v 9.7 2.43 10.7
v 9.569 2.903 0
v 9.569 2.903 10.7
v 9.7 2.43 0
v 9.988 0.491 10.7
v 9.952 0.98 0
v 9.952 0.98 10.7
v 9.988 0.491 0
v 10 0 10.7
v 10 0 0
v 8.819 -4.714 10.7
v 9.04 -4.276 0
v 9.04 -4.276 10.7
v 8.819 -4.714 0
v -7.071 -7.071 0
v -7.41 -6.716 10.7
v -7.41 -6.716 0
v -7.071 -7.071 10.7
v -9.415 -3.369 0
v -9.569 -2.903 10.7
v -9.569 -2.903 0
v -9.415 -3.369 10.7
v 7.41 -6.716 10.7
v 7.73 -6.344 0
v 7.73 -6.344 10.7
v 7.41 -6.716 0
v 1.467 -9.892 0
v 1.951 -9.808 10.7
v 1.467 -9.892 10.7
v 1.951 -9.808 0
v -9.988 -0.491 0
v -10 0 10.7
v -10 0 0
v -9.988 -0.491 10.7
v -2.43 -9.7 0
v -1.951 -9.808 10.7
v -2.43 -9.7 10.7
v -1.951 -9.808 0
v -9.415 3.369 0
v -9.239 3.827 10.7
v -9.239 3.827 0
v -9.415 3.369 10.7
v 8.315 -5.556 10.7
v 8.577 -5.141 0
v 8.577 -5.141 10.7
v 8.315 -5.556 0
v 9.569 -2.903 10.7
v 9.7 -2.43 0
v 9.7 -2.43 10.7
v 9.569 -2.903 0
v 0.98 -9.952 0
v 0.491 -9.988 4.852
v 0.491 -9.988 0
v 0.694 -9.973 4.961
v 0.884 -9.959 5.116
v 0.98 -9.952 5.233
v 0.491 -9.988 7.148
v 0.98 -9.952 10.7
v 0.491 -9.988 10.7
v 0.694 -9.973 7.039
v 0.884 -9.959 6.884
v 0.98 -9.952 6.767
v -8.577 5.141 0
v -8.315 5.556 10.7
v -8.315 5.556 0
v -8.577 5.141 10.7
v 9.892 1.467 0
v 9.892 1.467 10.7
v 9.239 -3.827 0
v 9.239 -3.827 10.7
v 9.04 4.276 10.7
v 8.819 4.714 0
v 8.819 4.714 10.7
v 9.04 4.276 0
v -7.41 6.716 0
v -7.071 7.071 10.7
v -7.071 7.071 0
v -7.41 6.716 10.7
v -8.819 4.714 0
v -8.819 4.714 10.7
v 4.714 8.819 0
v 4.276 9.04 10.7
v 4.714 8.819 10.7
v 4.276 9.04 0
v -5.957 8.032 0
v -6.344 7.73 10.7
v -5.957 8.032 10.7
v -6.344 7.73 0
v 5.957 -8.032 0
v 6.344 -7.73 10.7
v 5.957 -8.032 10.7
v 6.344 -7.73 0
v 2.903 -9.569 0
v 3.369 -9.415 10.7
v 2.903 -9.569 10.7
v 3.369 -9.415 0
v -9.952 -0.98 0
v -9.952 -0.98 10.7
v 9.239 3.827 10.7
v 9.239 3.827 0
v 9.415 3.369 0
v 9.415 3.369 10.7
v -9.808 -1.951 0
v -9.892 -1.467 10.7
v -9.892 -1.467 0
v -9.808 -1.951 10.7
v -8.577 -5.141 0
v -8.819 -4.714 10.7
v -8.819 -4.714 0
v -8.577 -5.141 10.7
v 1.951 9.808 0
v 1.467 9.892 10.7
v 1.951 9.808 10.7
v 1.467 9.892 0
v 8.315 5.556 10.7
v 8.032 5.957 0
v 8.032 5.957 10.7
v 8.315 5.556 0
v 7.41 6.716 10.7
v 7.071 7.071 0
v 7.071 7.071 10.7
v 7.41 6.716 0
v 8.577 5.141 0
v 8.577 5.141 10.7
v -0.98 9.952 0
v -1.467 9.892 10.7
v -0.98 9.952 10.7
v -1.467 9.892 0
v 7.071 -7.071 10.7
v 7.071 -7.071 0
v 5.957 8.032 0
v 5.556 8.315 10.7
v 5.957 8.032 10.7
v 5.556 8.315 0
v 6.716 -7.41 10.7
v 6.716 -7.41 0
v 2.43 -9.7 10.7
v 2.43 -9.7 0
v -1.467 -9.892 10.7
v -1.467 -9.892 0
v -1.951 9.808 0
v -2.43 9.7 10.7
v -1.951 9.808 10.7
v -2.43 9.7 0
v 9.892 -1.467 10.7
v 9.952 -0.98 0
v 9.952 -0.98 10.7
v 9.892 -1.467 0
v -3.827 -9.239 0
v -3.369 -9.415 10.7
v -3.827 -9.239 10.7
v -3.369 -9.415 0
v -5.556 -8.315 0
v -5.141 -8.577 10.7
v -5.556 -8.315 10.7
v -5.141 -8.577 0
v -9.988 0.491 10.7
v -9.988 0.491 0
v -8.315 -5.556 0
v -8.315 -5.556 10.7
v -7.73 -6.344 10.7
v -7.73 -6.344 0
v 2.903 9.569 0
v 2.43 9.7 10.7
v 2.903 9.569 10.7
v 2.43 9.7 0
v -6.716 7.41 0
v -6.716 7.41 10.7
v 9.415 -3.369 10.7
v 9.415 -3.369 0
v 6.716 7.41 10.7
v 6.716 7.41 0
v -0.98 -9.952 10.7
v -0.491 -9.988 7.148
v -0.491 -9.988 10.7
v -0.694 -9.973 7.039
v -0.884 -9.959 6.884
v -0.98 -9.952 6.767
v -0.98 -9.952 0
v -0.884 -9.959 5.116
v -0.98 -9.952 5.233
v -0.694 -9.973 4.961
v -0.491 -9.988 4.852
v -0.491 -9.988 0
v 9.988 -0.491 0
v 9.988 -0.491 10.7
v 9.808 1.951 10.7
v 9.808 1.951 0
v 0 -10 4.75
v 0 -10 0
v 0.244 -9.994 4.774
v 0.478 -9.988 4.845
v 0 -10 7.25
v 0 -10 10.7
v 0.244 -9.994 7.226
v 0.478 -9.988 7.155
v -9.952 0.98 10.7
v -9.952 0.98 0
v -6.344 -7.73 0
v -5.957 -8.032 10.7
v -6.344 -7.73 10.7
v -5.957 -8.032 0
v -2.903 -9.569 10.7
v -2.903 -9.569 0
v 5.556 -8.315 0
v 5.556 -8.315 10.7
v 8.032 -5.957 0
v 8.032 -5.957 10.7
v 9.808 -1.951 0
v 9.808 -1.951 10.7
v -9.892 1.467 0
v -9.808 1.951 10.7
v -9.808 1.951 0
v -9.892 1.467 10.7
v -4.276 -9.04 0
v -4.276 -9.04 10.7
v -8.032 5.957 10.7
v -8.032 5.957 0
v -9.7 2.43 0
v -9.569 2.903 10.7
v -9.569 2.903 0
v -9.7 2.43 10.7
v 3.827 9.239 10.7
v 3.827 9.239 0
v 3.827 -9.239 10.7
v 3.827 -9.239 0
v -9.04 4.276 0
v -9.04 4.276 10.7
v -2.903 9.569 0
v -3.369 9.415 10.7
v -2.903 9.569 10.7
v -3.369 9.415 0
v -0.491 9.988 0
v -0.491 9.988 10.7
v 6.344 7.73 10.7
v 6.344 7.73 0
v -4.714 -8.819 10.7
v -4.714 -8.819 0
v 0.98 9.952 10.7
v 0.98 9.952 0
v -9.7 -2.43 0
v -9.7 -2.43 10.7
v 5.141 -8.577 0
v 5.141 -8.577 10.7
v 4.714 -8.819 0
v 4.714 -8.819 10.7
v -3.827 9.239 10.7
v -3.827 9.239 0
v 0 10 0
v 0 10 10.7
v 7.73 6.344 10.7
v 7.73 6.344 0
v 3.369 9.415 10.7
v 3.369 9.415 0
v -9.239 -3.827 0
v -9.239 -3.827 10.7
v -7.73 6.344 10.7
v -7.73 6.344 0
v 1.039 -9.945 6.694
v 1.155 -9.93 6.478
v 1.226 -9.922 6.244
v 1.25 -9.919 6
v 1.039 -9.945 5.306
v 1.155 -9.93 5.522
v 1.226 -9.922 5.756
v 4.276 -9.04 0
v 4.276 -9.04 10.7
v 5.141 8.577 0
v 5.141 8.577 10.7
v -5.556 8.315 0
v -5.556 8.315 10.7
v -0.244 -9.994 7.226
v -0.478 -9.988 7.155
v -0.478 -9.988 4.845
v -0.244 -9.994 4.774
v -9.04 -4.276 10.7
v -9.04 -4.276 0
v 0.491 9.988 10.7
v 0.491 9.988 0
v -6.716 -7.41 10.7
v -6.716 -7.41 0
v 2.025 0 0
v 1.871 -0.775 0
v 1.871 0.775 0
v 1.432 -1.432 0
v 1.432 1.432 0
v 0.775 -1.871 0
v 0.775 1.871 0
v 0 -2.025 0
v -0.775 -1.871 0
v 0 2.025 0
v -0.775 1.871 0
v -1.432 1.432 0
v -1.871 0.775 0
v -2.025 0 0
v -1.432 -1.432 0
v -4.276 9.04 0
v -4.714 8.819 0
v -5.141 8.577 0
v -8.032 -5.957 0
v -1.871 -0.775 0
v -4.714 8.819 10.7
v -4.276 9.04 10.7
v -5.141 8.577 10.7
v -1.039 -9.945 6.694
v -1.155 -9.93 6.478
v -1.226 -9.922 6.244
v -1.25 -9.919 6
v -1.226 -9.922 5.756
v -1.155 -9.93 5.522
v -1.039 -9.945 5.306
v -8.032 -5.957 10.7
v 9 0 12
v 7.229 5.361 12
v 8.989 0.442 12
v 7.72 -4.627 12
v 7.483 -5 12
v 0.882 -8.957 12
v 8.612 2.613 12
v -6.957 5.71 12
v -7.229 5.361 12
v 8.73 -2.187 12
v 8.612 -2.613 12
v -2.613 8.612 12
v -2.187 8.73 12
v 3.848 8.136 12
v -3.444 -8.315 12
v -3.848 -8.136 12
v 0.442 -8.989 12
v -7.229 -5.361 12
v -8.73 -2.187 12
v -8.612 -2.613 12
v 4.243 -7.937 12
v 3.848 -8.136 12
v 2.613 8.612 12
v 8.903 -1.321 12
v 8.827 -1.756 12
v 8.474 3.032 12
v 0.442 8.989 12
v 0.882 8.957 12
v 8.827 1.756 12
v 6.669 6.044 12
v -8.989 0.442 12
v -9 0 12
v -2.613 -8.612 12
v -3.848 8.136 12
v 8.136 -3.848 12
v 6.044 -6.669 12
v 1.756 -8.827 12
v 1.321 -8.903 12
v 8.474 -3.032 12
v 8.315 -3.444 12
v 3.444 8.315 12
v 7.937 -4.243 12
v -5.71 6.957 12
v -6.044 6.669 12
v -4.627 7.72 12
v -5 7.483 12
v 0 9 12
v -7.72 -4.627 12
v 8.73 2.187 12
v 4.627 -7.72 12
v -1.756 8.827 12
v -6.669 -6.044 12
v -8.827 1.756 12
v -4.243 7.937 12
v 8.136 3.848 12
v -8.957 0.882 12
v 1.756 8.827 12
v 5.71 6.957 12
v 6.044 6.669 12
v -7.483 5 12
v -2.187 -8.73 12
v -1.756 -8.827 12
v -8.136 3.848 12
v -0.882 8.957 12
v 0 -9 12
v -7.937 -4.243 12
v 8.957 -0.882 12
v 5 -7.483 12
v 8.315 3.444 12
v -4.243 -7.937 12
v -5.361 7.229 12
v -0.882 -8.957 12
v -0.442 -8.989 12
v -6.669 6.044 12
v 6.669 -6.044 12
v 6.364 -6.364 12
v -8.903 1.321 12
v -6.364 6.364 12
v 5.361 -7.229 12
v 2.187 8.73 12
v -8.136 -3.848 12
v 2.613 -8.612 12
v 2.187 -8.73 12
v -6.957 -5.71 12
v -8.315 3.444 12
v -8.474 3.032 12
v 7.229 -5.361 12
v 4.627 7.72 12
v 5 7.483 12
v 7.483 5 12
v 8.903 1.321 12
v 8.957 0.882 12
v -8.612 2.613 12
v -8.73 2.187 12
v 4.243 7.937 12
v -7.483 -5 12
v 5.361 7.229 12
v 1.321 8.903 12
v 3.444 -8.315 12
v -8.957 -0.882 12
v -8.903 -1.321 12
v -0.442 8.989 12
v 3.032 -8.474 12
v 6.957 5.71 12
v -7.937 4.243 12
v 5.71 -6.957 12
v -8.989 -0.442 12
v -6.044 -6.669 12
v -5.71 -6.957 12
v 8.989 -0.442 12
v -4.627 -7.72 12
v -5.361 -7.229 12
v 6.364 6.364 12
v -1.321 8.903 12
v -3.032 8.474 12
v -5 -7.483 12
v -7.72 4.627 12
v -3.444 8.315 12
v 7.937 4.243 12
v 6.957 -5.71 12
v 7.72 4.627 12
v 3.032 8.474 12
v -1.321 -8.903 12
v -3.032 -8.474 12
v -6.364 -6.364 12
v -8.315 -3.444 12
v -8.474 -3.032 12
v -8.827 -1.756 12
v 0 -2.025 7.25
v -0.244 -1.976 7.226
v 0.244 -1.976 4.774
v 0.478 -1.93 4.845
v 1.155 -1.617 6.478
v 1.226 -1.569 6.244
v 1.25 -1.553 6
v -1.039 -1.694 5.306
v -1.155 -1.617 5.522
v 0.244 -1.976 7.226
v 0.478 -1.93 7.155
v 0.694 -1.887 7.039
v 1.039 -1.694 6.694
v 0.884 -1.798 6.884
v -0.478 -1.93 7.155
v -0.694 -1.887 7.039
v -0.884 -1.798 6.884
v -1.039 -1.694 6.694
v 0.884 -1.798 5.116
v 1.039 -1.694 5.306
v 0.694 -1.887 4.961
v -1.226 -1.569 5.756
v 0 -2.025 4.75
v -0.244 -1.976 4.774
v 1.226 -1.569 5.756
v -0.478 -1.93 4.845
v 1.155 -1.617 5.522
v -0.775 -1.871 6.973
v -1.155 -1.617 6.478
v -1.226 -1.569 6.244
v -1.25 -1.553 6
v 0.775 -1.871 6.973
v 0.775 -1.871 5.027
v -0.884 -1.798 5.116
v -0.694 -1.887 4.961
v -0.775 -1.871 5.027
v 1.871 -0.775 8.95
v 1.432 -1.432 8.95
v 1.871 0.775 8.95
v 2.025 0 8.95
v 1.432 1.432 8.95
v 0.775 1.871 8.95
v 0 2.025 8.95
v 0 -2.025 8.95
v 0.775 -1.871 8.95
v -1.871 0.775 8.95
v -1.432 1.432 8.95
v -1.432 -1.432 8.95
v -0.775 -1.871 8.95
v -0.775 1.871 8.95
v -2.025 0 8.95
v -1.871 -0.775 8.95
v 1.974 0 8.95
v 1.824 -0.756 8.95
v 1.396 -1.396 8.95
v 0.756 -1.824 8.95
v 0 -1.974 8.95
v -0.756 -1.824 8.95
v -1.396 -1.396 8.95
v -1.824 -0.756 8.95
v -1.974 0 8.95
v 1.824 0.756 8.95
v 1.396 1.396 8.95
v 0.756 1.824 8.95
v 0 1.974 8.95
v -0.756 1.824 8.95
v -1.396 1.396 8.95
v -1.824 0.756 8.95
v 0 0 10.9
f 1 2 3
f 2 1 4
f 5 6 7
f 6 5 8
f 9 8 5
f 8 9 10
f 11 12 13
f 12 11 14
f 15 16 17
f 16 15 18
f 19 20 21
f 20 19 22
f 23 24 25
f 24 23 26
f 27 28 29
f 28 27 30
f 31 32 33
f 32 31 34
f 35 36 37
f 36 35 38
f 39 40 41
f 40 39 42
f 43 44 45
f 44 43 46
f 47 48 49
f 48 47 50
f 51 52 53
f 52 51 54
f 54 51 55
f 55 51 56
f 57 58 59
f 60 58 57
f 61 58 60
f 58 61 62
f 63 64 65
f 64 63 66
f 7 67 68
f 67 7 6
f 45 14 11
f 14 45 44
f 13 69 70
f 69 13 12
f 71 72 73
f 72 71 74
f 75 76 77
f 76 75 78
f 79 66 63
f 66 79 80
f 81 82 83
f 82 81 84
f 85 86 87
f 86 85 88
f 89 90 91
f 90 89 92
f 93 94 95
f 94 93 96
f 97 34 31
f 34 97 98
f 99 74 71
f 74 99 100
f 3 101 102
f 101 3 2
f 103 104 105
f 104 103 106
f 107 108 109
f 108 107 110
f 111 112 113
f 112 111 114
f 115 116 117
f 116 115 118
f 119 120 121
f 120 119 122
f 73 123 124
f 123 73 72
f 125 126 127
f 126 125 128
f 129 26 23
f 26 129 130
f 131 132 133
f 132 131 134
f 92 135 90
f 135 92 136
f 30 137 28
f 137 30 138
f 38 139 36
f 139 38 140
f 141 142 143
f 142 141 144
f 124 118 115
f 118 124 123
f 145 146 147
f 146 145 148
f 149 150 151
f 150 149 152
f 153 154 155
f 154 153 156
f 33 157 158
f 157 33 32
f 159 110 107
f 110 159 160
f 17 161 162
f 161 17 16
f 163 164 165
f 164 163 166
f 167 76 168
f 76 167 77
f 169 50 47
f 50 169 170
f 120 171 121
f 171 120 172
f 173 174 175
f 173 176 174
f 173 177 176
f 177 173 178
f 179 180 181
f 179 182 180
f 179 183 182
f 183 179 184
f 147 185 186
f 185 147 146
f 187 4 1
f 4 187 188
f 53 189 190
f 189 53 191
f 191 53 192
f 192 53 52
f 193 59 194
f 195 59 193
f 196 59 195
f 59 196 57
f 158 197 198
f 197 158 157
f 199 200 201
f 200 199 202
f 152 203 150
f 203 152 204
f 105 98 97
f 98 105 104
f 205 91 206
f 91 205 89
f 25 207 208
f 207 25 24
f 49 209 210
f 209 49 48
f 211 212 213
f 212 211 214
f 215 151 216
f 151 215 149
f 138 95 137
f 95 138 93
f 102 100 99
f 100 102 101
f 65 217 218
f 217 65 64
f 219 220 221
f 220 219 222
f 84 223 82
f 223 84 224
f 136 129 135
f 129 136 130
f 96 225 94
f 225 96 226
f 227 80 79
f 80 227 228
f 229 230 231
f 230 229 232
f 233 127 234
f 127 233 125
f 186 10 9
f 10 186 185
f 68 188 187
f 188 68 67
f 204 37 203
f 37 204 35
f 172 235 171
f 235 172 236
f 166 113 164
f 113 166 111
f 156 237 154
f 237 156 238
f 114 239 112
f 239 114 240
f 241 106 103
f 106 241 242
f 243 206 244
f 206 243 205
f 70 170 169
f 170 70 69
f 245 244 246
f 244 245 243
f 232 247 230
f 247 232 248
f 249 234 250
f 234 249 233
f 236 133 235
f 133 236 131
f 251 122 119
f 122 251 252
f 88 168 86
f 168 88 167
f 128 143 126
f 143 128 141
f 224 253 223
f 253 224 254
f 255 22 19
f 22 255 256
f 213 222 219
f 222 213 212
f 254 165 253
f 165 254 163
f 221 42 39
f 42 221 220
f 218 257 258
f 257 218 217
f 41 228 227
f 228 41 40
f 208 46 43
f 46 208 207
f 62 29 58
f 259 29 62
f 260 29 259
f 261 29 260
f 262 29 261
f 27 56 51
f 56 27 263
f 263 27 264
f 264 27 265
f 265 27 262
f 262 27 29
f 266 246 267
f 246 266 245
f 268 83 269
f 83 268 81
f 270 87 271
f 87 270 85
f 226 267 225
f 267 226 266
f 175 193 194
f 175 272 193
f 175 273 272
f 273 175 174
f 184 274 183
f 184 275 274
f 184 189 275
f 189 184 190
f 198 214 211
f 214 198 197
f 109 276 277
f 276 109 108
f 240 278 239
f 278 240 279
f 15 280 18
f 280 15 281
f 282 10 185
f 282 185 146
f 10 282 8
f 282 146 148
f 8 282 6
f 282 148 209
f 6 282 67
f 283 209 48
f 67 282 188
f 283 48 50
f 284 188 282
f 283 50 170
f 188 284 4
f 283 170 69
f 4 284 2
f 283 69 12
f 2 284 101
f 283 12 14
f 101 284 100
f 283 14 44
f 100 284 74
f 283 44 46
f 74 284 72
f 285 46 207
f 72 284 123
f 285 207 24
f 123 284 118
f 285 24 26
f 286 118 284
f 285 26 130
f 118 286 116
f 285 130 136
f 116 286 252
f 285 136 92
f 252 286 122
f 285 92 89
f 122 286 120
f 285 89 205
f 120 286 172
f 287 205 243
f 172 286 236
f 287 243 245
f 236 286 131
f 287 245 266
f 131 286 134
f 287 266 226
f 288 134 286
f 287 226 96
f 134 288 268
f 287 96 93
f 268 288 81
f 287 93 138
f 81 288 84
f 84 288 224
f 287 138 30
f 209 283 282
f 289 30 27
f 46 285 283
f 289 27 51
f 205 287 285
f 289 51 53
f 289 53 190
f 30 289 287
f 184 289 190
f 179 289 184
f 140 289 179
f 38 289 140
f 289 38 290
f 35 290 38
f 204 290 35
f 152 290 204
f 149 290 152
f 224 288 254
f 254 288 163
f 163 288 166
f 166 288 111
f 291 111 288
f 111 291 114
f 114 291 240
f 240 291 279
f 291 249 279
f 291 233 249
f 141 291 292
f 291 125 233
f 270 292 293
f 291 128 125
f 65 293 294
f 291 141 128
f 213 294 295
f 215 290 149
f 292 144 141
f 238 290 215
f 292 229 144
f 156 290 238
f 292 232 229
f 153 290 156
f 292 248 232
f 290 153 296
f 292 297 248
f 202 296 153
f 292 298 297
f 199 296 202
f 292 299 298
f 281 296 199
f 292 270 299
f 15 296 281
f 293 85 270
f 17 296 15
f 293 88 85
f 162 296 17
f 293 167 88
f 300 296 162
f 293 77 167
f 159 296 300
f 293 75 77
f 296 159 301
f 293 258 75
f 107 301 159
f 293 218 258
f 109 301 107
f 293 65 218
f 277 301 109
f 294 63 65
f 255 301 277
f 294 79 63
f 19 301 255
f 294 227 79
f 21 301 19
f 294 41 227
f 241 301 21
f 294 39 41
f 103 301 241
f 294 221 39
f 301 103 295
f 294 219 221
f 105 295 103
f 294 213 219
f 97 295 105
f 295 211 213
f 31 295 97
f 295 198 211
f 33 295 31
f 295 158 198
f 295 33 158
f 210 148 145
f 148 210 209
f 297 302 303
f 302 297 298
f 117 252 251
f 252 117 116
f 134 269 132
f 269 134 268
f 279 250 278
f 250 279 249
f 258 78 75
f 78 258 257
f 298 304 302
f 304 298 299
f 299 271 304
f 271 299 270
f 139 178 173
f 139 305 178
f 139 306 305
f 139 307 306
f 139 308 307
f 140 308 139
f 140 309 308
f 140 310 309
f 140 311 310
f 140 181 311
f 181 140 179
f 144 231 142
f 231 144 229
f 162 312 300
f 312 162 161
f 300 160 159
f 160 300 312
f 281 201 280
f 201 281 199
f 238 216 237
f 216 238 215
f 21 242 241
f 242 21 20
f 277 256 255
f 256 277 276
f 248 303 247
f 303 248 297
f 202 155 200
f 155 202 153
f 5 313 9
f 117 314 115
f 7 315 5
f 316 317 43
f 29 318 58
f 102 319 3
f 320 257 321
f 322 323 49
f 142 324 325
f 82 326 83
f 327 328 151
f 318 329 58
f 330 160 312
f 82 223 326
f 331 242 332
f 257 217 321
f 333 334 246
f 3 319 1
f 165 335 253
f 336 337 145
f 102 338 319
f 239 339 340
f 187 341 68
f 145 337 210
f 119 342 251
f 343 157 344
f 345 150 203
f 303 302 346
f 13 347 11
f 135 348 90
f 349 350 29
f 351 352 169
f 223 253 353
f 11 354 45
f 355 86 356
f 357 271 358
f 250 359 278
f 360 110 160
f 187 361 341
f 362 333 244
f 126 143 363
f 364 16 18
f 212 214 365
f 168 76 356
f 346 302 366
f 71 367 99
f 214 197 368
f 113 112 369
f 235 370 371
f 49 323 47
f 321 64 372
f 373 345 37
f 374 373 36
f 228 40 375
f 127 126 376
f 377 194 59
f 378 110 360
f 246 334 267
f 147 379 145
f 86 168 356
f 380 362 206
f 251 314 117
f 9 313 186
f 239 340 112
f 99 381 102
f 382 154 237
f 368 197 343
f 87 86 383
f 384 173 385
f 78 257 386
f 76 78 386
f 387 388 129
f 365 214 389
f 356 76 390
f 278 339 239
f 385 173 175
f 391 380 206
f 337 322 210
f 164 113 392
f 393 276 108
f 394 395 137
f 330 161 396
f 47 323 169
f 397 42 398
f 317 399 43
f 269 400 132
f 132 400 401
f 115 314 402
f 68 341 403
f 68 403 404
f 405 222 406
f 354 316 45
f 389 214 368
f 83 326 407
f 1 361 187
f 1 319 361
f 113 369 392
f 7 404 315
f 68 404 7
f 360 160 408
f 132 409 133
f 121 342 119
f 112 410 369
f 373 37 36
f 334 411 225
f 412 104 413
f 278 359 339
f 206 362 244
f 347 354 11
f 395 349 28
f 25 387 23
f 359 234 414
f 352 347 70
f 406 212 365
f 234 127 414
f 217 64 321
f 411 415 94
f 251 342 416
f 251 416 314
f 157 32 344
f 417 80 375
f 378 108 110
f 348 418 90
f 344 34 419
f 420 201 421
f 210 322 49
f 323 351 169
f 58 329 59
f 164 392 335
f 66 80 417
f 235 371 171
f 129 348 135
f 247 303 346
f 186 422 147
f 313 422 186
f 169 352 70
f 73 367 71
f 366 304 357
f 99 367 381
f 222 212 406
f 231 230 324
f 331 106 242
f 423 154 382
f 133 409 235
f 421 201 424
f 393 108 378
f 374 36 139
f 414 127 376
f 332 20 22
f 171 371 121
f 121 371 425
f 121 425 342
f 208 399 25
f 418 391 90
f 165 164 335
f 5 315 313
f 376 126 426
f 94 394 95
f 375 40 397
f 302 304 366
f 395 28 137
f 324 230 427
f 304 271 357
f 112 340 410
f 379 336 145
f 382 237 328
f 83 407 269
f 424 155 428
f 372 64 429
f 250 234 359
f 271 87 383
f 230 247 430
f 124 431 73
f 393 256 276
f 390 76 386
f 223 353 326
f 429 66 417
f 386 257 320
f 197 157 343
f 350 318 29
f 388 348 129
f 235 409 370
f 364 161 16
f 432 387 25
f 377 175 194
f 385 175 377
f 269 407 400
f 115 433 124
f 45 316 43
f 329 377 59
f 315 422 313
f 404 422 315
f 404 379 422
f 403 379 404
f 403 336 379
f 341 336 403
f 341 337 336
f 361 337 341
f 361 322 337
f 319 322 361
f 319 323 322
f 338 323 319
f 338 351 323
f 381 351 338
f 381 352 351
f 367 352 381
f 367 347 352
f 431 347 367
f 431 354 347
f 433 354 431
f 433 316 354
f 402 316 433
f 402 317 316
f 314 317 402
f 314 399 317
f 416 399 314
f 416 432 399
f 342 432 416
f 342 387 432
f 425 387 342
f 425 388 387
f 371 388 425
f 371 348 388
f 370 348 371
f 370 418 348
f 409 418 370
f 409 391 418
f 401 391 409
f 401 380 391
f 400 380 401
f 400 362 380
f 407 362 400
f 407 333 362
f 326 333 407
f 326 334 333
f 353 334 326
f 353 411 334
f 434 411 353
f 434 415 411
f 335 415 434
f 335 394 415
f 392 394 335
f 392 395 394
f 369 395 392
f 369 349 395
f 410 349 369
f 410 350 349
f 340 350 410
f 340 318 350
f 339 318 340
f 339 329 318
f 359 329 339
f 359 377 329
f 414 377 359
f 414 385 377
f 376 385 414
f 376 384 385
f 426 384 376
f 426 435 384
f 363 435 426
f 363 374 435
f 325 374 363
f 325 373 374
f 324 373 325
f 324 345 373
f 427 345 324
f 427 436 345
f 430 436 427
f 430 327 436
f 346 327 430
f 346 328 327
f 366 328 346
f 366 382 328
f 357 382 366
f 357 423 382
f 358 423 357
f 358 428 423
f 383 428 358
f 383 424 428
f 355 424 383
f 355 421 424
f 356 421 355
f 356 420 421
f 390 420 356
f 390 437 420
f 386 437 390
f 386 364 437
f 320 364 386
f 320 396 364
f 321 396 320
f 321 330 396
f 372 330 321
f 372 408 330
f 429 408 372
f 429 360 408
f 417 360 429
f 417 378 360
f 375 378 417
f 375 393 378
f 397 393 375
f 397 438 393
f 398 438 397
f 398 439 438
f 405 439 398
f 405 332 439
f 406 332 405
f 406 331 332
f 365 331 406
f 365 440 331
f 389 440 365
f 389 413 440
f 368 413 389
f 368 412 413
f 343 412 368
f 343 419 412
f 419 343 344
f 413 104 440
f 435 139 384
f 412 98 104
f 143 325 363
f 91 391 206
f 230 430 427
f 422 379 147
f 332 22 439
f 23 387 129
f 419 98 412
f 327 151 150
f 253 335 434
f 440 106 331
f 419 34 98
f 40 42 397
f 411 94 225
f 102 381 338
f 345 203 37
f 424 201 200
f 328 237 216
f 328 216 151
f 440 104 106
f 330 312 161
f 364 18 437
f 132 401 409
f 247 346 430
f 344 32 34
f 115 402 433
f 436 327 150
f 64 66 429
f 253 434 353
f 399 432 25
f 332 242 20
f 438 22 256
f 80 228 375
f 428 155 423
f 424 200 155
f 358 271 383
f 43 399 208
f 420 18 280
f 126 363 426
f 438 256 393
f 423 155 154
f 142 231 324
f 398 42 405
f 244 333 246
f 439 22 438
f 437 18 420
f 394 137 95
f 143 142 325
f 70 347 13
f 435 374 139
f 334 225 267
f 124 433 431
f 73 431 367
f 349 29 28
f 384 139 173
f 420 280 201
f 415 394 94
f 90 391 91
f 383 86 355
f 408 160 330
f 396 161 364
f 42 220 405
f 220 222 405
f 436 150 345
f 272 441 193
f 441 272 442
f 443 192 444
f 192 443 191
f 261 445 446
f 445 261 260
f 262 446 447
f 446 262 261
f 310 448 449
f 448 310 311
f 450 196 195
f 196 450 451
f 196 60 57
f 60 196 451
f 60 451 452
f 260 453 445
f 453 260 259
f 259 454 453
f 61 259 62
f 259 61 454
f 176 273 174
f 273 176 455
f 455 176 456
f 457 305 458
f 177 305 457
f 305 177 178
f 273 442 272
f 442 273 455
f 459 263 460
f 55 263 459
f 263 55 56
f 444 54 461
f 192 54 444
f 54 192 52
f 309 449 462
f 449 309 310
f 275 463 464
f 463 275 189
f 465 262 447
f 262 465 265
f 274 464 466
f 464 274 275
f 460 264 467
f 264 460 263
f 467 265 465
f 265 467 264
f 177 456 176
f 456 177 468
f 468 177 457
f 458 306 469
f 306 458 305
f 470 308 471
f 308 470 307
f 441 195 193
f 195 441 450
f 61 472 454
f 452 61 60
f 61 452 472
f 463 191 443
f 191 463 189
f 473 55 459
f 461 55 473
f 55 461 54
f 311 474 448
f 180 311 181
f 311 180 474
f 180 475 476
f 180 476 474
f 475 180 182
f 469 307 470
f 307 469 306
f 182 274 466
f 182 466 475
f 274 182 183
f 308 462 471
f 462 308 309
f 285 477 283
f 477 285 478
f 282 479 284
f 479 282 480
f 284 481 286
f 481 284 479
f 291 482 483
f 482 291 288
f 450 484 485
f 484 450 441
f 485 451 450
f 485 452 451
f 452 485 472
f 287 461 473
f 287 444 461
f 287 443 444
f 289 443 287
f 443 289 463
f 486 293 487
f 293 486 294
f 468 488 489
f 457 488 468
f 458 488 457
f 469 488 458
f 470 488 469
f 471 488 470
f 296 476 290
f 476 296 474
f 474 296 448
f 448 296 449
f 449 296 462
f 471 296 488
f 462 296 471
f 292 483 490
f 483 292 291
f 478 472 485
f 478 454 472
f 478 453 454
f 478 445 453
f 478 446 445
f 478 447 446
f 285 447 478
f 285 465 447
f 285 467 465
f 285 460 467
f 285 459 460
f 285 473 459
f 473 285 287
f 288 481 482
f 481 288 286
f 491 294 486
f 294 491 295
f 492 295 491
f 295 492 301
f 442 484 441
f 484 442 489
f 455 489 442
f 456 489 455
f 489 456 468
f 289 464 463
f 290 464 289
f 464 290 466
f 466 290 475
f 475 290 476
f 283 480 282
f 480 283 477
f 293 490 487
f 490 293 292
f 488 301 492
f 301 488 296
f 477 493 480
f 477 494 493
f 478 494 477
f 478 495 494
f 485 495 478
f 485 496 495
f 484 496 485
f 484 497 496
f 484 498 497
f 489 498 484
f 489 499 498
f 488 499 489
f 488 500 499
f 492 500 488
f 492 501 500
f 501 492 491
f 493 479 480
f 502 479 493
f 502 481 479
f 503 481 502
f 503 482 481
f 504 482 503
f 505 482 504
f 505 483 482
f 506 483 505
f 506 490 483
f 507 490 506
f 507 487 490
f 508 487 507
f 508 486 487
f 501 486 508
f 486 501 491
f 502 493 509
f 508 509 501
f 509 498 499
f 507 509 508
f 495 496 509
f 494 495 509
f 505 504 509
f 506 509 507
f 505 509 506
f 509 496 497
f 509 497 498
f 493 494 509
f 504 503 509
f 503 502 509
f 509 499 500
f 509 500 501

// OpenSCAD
//OpenSCAD-Skript

//Moduldefinition mit Parametern für Frontplattensystem im 19mm-Raster
module PotiKnopf (
//Parameter
diami=4.05,   //Wellendurchmesser Poti
diama=20,    //Außendurchmesser Knopf
diams=2.5,   //Klemmschraubendurchmesser 
hght=12,     //Höhe Knopf
hghti=10,  //Höhe Indikator
wdthi=1      //Breite Indikator
)
//Beginn Modul
{
difference(){   //difference 1
union(){        //union 1
difference(){   //difference 2
union(){        //union 2
    //alles, was vor der nächsten geschweiften Klammer steht, wird zusammengefügt (union 2)
//Körper des Frontplattensegments
cylinder(d=diama,h=hght-1.3,$fn=128);
translate([0,0,hght-1.3]) cylinder(d1=diama,d2=diama-2,h=1.3,$fn=128);
 
//Indikator
translate([-wdthi/2,0,0]) cube([wdthi,diama/2-0.1,hghti]);

}               //union 2 end
    //alles, was vor der nächsten geschweiften Klammer steht, wird davon abgezogen (difference 2)
//Anschrägung Indikator
translate([-wdthi,diama/2,hght-1]) rotate([40,0,0]) cube([2*wdthi,5,5]);
//Bohrung Klemmschraube M3
rotate([90,0,0]) translate([0,hght/2,0]) cylinder(d=diams,h=15,$fn=32);
//Bohrung Achse
translate([0,0,-0.05]) cylinder(d=diami,h=hght-3,$fn=16);
translate([0,0,hght-3-0.1]) cylinder(d1=diami,d2=0,h=2,$fn=16);
}  //difference 2 end
    //alles, was vor der nächsten geschweiften Klammer steht, wird dazu hinzugefügt (union 1)

}               //union 1 end
    //alles, was vor der nächsten geschweiften Klammer steht, wird davon wieder abgezogen (difference 1)

}               //difference 1 end

}  //module end

//Hier werden Instanzen des Moduls aufgerufen
translate([0,0,0]) PotiKnopf();
